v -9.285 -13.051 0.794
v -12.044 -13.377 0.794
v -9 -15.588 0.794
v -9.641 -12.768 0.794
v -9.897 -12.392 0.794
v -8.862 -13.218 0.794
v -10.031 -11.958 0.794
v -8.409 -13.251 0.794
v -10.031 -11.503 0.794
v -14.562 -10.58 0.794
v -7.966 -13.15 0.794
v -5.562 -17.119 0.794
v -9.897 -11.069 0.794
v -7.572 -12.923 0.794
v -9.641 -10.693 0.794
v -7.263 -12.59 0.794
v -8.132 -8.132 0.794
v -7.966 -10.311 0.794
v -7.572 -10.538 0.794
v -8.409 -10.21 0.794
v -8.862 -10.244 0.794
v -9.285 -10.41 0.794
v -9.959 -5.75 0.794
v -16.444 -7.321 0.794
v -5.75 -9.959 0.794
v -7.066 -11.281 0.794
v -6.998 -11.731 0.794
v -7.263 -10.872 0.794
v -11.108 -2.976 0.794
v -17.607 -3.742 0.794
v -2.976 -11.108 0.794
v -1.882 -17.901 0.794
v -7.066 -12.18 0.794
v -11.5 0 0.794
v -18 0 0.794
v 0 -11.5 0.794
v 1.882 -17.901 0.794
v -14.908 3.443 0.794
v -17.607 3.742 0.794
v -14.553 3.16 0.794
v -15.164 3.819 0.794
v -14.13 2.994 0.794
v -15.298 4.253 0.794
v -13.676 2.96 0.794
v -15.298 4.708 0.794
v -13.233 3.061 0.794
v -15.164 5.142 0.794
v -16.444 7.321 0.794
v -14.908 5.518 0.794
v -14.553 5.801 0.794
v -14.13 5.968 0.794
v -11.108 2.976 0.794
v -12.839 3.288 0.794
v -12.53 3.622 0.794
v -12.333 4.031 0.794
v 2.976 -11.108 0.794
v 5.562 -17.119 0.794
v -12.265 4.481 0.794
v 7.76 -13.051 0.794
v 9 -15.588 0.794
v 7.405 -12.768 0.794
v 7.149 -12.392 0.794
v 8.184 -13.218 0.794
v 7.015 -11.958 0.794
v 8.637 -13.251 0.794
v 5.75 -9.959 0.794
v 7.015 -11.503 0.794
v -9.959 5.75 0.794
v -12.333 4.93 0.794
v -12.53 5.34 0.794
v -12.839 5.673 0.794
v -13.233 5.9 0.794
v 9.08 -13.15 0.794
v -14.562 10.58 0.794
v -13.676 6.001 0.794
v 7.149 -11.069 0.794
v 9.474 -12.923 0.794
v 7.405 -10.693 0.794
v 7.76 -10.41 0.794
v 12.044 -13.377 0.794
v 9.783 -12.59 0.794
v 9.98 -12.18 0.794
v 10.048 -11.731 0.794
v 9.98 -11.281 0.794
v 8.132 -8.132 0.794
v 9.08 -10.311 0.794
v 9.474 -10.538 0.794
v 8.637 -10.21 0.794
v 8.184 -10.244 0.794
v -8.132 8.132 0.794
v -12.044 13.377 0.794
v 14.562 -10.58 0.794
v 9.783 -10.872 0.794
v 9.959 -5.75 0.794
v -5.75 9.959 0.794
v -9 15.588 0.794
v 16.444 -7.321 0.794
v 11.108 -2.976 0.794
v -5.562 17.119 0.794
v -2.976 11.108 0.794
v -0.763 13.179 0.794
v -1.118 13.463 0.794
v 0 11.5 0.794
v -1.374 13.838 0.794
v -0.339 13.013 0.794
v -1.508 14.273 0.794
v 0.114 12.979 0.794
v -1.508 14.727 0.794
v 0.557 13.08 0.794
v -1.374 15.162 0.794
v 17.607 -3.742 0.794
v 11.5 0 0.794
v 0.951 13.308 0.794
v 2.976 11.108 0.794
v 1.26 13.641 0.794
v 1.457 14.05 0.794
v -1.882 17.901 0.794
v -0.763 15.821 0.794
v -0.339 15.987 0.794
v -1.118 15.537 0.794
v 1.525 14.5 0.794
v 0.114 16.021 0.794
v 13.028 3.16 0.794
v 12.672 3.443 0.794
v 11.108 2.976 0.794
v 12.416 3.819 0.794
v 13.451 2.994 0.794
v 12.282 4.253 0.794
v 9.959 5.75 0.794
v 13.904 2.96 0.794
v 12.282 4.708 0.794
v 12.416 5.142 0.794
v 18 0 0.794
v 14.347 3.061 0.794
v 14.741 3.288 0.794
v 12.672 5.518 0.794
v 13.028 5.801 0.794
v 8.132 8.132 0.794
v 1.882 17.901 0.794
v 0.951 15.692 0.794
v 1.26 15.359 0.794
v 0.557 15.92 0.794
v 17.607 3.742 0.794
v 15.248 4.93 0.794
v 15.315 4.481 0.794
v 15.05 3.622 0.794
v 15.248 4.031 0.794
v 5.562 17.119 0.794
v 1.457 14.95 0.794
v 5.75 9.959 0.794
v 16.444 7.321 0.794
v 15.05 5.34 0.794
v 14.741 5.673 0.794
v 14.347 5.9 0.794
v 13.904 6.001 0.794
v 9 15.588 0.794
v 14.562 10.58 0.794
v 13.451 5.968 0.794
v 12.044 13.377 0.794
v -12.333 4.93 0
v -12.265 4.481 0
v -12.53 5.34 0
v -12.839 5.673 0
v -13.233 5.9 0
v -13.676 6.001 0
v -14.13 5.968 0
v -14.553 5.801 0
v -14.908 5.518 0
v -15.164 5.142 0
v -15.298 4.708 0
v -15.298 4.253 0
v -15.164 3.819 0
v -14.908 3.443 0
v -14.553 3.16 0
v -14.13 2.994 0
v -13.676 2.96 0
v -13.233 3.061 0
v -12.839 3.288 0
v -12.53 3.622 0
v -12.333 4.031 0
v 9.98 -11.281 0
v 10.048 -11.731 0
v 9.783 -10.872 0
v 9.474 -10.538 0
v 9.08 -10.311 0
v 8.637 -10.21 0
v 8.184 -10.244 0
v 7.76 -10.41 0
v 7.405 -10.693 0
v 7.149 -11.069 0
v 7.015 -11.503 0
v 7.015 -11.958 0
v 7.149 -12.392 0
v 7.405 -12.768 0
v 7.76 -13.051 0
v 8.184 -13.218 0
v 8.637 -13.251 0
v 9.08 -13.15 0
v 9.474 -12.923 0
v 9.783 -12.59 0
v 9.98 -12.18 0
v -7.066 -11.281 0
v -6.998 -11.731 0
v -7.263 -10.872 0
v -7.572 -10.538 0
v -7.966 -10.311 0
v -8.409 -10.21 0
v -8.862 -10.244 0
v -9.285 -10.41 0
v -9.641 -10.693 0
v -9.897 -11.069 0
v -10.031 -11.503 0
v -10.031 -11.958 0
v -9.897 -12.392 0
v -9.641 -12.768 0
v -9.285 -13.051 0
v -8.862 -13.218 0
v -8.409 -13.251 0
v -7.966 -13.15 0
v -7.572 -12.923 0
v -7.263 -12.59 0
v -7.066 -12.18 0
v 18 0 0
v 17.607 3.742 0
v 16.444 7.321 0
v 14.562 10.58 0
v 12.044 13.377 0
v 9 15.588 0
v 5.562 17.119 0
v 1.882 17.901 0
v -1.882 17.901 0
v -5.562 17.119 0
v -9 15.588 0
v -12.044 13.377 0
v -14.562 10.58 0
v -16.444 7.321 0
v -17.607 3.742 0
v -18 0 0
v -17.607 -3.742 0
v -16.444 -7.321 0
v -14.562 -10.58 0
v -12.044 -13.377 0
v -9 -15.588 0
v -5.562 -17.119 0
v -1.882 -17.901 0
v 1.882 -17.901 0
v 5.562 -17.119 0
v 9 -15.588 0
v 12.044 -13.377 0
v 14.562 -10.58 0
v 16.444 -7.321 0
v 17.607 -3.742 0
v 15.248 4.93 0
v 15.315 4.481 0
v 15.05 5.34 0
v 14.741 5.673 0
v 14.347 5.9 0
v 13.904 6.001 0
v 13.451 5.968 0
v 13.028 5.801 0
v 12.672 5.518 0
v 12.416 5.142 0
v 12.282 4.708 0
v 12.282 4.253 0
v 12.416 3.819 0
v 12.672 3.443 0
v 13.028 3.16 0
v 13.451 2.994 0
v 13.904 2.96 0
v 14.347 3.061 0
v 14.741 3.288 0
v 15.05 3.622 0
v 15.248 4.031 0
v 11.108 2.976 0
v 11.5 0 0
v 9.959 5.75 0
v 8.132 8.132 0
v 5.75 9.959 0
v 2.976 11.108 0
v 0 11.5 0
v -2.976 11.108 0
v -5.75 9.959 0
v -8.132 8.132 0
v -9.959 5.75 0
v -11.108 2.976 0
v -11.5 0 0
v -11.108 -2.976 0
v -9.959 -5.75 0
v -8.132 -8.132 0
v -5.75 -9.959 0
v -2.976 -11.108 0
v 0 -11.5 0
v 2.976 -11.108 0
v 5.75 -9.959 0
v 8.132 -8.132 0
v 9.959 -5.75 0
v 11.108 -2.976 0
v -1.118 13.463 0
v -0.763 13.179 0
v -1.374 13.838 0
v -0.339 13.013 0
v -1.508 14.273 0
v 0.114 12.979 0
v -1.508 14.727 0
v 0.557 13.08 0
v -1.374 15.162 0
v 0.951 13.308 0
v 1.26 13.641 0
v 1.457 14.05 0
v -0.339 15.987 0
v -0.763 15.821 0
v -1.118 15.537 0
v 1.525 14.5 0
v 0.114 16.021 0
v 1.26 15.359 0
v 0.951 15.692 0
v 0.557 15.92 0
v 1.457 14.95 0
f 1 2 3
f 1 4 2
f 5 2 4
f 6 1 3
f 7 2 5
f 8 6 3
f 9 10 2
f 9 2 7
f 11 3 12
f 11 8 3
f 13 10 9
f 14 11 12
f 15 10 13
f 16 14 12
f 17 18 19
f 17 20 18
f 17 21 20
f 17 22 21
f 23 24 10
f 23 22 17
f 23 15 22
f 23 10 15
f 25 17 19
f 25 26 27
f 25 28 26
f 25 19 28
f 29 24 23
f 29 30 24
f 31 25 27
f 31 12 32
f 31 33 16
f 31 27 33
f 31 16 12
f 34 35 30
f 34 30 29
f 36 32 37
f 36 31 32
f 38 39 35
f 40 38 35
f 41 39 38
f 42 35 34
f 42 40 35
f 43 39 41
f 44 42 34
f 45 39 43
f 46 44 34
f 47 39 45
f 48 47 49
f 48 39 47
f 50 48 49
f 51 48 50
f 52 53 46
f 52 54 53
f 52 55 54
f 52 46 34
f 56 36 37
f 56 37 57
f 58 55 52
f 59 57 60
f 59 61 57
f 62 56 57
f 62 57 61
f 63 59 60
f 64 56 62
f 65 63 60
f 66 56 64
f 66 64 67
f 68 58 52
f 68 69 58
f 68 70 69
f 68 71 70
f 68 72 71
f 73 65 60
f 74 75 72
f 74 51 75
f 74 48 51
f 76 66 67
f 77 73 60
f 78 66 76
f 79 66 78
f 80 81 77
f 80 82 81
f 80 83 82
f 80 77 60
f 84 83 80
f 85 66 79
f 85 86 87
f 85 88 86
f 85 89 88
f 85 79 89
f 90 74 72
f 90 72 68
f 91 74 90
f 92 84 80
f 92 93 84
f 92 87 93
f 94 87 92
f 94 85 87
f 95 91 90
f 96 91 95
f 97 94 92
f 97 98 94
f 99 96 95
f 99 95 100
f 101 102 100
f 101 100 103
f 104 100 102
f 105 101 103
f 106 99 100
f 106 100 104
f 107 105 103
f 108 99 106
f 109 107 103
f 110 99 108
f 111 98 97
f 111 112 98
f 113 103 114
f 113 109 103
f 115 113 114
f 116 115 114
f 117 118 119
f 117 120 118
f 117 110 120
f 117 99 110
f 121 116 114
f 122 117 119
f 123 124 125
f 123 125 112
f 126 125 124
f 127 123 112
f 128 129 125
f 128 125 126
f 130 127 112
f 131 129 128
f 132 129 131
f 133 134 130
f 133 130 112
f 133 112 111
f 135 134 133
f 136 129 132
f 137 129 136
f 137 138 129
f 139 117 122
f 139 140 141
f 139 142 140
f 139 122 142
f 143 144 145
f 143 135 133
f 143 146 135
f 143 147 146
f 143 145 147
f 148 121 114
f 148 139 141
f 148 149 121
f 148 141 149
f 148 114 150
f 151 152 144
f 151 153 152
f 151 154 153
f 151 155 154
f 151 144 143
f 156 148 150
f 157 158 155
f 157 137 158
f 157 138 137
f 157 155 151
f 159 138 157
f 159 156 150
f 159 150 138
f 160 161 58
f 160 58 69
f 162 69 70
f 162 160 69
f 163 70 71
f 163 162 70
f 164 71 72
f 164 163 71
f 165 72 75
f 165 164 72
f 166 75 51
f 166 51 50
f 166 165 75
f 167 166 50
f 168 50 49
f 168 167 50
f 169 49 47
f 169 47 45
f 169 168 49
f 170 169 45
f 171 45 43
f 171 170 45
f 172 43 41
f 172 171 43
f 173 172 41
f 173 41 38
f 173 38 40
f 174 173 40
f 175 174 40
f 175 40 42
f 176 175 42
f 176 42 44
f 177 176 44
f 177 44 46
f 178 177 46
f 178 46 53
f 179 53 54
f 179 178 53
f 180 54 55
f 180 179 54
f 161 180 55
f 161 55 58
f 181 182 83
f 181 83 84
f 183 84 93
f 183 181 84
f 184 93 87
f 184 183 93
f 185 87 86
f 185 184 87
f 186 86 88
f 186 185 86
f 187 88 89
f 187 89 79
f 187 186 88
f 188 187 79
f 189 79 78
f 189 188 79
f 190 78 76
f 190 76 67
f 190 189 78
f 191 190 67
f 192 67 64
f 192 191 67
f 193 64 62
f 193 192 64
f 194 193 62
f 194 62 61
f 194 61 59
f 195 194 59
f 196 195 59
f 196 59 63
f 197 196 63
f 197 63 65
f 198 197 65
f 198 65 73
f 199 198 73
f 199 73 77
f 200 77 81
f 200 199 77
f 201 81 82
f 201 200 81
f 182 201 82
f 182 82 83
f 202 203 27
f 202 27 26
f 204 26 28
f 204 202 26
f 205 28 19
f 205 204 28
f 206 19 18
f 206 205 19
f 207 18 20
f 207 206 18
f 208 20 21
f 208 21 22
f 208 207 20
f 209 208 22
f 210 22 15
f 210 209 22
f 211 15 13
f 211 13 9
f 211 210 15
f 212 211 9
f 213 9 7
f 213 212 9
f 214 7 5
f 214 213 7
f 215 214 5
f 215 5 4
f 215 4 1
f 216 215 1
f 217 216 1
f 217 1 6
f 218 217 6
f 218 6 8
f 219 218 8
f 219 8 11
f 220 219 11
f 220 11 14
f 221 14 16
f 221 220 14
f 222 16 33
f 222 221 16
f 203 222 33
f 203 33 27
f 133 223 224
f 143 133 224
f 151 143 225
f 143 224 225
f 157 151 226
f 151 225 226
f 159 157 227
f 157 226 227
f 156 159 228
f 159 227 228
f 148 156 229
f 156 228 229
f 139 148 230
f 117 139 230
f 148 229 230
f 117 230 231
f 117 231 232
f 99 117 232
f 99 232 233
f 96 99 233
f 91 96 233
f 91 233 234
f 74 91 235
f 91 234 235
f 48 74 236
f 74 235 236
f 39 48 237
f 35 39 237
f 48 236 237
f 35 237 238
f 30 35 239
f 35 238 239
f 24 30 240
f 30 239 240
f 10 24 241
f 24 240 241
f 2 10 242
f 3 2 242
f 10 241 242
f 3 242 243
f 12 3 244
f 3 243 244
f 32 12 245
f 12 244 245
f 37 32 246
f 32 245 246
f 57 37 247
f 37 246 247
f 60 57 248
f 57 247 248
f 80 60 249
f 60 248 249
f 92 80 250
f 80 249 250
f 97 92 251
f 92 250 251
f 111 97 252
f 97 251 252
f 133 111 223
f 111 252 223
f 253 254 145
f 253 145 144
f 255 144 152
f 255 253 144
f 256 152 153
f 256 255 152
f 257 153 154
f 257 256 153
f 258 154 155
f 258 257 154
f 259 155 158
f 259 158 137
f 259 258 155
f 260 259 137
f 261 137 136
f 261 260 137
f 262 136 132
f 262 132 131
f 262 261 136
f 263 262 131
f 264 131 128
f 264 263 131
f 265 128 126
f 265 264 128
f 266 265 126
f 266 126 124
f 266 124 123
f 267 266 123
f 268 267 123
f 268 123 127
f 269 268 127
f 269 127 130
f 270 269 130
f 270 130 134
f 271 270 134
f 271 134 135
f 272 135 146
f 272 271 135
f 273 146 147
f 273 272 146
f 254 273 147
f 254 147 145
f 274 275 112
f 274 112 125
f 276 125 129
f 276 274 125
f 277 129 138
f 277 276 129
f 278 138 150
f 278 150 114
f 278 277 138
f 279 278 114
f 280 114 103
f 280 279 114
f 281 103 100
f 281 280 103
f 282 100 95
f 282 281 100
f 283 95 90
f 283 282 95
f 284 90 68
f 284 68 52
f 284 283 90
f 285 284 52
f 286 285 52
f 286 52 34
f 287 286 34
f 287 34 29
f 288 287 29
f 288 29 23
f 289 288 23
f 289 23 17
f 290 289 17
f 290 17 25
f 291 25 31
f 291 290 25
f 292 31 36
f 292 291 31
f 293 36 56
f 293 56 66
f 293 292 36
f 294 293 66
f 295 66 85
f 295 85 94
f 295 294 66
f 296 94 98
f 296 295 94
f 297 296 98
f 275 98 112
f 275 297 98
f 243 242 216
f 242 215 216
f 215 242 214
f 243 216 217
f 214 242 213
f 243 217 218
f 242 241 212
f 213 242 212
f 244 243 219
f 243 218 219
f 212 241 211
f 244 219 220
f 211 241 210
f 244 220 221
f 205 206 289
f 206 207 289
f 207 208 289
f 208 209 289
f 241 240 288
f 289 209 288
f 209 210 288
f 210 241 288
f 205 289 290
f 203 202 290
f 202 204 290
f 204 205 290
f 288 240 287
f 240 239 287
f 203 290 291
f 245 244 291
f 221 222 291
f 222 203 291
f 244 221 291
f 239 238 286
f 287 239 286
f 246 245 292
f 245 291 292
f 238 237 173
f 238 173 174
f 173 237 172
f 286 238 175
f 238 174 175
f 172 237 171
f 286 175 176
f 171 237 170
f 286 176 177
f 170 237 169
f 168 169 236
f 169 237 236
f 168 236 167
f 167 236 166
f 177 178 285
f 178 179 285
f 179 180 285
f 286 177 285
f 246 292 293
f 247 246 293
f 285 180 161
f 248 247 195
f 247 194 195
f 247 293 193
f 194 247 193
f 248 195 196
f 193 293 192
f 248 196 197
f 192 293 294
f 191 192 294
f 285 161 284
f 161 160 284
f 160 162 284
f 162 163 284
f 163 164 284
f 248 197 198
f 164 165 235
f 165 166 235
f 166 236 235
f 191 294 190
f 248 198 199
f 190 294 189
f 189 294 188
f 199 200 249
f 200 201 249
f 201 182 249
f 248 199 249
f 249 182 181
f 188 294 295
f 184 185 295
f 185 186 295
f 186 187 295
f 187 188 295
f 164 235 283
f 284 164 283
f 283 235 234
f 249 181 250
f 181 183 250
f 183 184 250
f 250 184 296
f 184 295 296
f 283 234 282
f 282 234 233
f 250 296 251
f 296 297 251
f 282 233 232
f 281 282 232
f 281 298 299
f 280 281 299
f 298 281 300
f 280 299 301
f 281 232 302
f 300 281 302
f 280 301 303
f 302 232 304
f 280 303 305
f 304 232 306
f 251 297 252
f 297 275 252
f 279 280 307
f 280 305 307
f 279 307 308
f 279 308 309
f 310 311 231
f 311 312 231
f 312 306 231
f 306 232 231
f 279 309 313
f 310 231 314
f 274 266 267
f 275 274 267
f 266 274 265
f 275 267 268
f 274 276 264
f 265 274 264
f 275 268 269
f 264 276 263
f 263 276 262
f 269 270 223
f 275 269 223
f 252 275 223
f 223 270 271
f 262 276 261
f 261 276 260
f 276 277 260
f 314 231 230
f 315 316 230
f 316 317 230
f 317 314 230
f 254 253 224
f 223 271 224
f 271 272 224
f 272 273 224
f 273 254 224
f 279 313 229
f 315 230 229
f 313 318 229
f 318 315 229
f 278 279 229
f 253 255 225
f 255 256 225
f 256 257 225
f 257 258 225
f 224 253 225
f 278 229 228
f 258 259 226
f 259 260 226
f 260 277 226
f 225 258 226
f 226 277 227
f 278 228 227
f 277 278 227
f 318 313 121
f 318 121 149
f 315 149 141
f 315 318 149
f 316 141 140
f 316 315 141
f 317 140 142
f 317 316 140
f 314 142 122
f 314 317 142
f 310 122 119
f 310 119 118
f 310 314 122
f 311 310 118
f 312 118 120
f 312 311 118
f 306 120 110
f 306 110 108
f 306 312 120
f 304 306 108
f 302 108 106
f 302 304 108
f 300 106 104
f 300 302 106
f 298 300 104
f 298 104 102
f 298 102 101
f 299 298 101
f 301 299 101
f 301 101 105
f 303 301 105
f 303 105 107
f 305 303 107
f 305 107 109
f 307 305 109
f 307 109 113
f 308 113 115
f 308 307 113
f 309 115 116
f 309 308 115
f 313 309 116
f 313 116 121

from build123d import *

# Parameters (mm, degrees)
SKETCH1_R           = 18
SKETCH1_R_2         = 11.5
SKETCH1_R_3         = 1.525
BOSS_EXTRUDE1_DEPTH = 0.79375


with BuildPart() as part:
    # Sketch1 → Boss-Extrude1 (new body)
    with BuildSketch(Plane.XY):
        Circle(SKETCH1_R)
        Circle(SKETCH1_R_2, mode=Mode.SUBTRACT)
        with Locations((0, 14.5)):
            Circle(SKETCH1_R_3, mode=Mode.SUBTRACT)
        with Locations((13.790319486, 4.480746418)):
            Circle(SKETCH1_R_3, mode=Mode.SUBTRACT)
        with Locations((8.522886158, -11.730746418)):
            Circle(SKETCH1_R_3, mode=Mode.SUBTRACT)
        with Locations((-8.522886158, -11.730746418)):
            Circle(SKETCH1_R_3, mode=Mode.SUBTRACT)
        with Locations((-13.790319486, 4.480746418)):
            Circle(SKETCH1_R_3, mode=Mode.SUBTRACT)
    extrude(amount=BOSS_EXTRUDE1_DEPTH)


solid = part.part
